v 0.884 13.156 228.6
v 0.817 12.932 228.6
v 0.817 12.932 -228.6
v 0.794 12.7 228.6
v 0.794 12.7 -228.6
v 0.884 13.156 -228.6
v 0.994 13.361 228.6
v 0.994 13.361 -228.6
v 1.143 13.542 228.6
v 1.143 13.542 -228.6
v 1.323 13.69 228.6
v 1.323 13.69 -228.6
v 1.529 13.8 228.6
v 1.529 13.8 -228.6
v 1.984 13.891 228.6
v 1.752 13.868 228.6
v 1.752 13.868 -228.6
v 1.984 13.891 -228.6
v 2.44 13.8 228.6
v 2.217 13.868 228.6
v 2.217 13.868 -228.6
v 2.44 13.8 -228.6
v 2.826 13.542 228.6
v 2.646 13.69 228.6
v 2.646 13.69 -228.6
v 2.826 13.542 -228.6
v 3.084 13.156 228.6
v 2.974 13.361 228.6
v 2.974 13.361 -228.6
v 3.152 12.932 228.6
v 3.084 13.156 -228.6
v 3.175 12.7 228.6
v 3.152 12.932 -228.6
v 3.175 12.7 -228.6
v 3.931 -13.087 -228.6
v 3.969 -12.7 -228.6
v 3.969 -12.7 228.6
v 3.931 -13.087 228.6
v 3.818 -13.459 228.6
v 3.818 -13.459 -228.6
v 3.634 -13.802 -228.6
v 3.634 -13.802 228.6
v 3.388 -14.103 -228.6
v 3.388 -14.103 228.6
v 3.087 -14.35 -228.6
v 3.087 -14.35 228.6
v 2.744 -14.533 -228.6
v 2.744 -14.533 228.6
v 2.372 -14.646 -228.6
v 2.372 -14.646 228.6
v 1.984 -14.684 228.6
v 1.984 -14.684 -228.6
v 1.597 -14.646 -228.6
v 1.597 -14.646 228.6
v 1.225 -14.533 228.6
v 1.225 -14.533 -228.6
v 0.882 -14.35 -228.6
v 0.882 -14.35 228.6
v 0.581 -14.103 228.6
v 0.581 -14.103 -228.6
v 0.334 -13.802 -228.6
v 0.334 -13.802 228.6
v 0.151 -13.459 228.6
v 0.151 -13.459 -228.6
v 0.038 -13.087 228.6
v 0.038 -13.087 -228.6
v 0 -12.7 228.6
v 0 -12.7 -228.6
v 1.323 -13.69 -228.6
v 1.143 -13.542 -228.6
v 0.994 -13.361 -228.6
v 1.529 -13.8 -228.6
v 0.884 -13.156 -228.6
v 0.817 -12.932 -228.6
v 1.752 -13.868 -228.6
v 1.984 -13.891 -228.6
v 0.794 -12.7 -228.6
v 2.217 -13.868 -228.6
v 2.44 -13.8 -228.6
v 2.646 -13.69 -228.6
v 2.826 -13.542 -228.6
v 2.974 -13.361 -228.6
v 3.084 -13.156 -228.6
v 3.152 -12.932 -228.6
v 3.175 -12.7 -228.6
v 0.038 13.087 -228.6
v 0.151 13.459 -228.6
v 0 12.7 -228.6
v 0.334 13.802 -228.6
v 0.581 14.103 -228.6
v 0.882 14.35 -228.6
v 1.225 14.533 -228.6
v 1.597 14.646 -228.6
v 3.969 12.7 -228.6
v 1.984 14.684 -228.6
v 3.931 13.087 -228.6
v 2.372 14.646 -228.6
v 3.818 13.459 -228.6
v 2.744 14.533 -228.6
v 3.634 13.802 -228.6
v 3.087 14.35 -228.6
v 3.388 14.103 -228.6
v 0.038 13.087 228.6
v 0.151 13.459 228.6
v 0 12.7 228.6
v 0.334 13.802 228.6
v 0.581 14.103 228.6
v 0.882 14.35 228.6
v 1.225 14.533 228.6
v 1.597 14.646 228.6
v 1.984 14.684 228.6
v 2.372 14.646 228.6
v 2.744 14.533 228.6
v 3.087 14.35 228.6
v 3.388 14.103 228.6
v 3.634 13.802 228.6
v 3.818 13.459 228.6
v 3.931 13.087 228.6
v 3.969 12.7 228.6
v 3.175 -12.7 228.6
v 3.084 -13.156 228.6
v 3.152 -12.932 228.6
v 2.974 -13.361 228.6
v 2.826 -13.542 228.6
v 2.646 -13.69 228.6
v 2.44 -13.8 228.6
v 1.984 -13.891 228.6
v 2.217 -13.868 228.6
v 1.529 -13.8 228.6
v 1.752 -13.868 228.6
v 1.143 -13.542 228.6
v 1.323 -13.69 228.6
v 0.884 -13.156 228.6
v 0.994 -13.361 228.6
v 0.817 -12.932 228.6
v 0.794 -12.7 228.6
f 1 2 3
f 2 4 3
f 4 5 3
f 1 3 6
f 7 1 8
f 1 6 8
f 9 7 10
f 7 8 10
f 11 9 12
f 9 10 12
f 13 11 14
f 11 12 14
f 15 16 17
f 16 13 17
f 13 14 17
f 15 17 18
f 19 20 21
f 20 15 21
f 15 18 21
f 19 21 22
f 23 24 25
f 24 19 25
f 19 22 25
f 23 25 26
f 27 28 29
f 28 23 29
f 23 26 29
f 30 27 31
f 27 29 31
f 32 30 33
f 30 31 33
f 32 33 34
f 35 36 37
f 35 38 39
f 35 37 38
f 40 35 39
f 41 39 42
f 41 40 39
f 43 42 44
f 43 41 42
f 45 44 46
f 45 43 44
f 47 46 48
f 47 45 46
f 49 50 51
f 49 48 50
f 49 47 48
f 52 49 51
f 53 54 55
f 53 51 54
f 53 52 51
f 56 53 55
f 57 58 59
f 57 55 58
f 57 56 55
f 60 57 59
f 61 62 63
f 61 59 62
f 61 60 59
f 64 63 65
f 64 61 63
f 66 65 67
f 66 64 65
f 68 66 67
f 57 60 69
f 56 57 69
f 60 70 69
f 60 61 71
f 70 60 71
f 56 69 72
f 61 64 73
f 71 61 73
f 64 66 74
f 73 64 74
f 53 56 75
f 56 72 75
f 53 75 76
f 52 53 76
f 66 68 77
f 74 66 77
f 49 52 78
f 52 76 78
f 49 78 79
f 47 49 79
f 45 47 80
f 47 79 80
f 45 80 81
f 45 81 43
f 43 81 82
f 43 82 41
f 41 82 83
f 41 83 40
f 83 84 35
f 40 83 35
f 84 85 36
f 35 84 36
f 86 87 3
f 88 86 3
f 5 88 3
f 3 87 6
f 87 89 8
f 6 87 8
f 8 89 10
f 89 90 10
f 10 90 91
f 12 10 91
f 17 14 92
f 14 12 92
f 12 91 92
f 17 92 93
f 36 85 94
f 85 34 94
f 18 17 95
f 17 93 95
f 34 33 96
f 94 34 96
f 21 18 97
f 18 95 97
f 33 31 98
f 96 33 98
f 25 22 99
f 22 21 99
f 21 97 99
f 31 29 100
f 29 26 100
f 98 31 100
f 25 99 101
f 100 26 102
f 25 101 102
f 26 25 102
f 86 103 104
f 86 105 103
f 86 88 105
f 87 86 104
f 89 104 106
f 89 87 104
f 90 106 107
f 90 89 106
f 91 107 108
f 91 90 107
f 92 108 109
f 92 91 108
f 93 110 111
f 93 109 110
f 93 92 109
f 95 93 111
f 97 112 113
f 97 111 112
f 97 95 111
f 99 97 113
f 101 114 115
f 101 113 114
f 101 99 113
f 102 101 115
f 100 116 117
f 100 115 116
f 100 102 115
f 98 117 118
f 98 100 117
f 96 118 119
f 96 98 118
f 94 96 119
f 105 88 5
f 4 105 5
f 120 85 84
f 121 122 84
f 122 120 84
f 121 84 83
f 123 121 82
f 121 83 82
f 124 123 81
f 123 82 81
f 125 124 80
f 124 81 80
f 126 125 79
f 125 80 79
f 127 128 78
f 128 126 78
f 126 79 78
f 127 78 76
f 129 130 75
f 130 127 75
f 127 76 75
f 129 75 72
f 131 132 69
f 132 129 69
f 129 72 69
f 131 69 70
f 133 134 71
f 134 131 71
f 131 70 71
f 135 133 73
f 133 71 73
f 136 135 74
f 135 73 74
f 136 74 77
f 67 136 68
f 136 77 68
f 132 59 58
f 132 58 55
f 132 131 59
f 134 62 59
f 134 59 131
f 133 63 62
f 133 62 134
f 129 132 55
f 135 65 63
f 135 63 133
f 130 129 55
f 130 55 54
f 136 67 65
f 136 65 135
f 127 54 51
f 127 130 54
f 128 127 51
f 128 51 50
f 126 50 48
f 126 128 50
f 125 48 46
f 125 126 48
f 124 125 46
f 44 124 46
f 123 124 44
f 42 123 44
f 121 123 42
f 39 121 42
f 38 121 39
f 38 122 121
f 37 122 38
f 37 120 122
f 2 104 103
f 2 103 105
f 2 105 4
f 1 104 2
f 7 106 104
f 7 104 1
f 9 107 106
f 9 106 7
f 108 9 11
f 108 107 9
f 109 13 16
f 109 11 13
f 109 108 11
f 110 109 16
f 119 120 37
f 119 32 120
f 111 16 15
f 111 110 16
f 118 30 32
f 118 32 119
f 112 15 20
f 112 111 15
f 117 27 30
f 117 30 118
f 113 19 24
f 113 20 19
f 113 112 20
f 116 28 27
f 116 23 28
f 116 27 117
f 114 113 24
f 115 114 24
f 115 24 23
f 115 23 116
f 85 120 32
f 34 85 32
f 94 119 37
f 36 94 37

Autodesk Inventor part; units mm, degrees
ref_plane "YZ Plane" through (0, 0, 0) normal (1, 0, 0) x (0, 1, 0)
ref_plane "XZ Plane" through (0, 0, 0) normal (0, 1, 0) x (-1, 0, 0)
ref_plane "XY Plane" through (0, 0, 0) normal (0, 0, 1) x (1, 0, 0)
sketch "Sketch1" plane through (0, 0, 0) normal (0, 0, 1) x (1, 0, 0)
  line L0 (-0.7938, 0) -> (4.7625, 0) projected
  line L1 (0, -20.5581) -> (0, 20.5581) projected
  line L2 (3.9688, 12.7) -> (3.9688, -12.7)
  arc A0 (3.9688, 12.7) -> (0, 12.7) centre (1.9844, 12.7) ccw
  arc A1 (0, -12.7) -> (3.9688, -12.7) centre (1.9844, -12.7) ccw
  arc A2 (0.7938, -12.7) -> (3.175, -12.7) centre (1.9844, -12.7) ccw
  line L3 (3.175, -12.7) -> (3.175, 12.7)
  arc A3 (3.175, 12.7) -> (0.7938, 12.7) centre (1.9844, 12.7) ccw
  line L4 (0, 12.7) -> (0.7938, 12.7)
  line L5 (0.7938, -12.7) -> (0, -12.7)
  line L6 (0, -12.7) -> (0, 12.7) construction
  point P0 (0, 0)
  point P1 (3.9688, 0)
  dimension "d0" = 0.7937
  dimension "d1" = 3.9688
  dimension "d2" = 25.4
extrude "Extrusion1" add sketch "Sketch1" along normal mid plane 457.2 contours L3 A3 L4 A0 L2 L0 | L0 L2 A1 L5 A2 L3
properties part number "slide outer" material "Steel"
